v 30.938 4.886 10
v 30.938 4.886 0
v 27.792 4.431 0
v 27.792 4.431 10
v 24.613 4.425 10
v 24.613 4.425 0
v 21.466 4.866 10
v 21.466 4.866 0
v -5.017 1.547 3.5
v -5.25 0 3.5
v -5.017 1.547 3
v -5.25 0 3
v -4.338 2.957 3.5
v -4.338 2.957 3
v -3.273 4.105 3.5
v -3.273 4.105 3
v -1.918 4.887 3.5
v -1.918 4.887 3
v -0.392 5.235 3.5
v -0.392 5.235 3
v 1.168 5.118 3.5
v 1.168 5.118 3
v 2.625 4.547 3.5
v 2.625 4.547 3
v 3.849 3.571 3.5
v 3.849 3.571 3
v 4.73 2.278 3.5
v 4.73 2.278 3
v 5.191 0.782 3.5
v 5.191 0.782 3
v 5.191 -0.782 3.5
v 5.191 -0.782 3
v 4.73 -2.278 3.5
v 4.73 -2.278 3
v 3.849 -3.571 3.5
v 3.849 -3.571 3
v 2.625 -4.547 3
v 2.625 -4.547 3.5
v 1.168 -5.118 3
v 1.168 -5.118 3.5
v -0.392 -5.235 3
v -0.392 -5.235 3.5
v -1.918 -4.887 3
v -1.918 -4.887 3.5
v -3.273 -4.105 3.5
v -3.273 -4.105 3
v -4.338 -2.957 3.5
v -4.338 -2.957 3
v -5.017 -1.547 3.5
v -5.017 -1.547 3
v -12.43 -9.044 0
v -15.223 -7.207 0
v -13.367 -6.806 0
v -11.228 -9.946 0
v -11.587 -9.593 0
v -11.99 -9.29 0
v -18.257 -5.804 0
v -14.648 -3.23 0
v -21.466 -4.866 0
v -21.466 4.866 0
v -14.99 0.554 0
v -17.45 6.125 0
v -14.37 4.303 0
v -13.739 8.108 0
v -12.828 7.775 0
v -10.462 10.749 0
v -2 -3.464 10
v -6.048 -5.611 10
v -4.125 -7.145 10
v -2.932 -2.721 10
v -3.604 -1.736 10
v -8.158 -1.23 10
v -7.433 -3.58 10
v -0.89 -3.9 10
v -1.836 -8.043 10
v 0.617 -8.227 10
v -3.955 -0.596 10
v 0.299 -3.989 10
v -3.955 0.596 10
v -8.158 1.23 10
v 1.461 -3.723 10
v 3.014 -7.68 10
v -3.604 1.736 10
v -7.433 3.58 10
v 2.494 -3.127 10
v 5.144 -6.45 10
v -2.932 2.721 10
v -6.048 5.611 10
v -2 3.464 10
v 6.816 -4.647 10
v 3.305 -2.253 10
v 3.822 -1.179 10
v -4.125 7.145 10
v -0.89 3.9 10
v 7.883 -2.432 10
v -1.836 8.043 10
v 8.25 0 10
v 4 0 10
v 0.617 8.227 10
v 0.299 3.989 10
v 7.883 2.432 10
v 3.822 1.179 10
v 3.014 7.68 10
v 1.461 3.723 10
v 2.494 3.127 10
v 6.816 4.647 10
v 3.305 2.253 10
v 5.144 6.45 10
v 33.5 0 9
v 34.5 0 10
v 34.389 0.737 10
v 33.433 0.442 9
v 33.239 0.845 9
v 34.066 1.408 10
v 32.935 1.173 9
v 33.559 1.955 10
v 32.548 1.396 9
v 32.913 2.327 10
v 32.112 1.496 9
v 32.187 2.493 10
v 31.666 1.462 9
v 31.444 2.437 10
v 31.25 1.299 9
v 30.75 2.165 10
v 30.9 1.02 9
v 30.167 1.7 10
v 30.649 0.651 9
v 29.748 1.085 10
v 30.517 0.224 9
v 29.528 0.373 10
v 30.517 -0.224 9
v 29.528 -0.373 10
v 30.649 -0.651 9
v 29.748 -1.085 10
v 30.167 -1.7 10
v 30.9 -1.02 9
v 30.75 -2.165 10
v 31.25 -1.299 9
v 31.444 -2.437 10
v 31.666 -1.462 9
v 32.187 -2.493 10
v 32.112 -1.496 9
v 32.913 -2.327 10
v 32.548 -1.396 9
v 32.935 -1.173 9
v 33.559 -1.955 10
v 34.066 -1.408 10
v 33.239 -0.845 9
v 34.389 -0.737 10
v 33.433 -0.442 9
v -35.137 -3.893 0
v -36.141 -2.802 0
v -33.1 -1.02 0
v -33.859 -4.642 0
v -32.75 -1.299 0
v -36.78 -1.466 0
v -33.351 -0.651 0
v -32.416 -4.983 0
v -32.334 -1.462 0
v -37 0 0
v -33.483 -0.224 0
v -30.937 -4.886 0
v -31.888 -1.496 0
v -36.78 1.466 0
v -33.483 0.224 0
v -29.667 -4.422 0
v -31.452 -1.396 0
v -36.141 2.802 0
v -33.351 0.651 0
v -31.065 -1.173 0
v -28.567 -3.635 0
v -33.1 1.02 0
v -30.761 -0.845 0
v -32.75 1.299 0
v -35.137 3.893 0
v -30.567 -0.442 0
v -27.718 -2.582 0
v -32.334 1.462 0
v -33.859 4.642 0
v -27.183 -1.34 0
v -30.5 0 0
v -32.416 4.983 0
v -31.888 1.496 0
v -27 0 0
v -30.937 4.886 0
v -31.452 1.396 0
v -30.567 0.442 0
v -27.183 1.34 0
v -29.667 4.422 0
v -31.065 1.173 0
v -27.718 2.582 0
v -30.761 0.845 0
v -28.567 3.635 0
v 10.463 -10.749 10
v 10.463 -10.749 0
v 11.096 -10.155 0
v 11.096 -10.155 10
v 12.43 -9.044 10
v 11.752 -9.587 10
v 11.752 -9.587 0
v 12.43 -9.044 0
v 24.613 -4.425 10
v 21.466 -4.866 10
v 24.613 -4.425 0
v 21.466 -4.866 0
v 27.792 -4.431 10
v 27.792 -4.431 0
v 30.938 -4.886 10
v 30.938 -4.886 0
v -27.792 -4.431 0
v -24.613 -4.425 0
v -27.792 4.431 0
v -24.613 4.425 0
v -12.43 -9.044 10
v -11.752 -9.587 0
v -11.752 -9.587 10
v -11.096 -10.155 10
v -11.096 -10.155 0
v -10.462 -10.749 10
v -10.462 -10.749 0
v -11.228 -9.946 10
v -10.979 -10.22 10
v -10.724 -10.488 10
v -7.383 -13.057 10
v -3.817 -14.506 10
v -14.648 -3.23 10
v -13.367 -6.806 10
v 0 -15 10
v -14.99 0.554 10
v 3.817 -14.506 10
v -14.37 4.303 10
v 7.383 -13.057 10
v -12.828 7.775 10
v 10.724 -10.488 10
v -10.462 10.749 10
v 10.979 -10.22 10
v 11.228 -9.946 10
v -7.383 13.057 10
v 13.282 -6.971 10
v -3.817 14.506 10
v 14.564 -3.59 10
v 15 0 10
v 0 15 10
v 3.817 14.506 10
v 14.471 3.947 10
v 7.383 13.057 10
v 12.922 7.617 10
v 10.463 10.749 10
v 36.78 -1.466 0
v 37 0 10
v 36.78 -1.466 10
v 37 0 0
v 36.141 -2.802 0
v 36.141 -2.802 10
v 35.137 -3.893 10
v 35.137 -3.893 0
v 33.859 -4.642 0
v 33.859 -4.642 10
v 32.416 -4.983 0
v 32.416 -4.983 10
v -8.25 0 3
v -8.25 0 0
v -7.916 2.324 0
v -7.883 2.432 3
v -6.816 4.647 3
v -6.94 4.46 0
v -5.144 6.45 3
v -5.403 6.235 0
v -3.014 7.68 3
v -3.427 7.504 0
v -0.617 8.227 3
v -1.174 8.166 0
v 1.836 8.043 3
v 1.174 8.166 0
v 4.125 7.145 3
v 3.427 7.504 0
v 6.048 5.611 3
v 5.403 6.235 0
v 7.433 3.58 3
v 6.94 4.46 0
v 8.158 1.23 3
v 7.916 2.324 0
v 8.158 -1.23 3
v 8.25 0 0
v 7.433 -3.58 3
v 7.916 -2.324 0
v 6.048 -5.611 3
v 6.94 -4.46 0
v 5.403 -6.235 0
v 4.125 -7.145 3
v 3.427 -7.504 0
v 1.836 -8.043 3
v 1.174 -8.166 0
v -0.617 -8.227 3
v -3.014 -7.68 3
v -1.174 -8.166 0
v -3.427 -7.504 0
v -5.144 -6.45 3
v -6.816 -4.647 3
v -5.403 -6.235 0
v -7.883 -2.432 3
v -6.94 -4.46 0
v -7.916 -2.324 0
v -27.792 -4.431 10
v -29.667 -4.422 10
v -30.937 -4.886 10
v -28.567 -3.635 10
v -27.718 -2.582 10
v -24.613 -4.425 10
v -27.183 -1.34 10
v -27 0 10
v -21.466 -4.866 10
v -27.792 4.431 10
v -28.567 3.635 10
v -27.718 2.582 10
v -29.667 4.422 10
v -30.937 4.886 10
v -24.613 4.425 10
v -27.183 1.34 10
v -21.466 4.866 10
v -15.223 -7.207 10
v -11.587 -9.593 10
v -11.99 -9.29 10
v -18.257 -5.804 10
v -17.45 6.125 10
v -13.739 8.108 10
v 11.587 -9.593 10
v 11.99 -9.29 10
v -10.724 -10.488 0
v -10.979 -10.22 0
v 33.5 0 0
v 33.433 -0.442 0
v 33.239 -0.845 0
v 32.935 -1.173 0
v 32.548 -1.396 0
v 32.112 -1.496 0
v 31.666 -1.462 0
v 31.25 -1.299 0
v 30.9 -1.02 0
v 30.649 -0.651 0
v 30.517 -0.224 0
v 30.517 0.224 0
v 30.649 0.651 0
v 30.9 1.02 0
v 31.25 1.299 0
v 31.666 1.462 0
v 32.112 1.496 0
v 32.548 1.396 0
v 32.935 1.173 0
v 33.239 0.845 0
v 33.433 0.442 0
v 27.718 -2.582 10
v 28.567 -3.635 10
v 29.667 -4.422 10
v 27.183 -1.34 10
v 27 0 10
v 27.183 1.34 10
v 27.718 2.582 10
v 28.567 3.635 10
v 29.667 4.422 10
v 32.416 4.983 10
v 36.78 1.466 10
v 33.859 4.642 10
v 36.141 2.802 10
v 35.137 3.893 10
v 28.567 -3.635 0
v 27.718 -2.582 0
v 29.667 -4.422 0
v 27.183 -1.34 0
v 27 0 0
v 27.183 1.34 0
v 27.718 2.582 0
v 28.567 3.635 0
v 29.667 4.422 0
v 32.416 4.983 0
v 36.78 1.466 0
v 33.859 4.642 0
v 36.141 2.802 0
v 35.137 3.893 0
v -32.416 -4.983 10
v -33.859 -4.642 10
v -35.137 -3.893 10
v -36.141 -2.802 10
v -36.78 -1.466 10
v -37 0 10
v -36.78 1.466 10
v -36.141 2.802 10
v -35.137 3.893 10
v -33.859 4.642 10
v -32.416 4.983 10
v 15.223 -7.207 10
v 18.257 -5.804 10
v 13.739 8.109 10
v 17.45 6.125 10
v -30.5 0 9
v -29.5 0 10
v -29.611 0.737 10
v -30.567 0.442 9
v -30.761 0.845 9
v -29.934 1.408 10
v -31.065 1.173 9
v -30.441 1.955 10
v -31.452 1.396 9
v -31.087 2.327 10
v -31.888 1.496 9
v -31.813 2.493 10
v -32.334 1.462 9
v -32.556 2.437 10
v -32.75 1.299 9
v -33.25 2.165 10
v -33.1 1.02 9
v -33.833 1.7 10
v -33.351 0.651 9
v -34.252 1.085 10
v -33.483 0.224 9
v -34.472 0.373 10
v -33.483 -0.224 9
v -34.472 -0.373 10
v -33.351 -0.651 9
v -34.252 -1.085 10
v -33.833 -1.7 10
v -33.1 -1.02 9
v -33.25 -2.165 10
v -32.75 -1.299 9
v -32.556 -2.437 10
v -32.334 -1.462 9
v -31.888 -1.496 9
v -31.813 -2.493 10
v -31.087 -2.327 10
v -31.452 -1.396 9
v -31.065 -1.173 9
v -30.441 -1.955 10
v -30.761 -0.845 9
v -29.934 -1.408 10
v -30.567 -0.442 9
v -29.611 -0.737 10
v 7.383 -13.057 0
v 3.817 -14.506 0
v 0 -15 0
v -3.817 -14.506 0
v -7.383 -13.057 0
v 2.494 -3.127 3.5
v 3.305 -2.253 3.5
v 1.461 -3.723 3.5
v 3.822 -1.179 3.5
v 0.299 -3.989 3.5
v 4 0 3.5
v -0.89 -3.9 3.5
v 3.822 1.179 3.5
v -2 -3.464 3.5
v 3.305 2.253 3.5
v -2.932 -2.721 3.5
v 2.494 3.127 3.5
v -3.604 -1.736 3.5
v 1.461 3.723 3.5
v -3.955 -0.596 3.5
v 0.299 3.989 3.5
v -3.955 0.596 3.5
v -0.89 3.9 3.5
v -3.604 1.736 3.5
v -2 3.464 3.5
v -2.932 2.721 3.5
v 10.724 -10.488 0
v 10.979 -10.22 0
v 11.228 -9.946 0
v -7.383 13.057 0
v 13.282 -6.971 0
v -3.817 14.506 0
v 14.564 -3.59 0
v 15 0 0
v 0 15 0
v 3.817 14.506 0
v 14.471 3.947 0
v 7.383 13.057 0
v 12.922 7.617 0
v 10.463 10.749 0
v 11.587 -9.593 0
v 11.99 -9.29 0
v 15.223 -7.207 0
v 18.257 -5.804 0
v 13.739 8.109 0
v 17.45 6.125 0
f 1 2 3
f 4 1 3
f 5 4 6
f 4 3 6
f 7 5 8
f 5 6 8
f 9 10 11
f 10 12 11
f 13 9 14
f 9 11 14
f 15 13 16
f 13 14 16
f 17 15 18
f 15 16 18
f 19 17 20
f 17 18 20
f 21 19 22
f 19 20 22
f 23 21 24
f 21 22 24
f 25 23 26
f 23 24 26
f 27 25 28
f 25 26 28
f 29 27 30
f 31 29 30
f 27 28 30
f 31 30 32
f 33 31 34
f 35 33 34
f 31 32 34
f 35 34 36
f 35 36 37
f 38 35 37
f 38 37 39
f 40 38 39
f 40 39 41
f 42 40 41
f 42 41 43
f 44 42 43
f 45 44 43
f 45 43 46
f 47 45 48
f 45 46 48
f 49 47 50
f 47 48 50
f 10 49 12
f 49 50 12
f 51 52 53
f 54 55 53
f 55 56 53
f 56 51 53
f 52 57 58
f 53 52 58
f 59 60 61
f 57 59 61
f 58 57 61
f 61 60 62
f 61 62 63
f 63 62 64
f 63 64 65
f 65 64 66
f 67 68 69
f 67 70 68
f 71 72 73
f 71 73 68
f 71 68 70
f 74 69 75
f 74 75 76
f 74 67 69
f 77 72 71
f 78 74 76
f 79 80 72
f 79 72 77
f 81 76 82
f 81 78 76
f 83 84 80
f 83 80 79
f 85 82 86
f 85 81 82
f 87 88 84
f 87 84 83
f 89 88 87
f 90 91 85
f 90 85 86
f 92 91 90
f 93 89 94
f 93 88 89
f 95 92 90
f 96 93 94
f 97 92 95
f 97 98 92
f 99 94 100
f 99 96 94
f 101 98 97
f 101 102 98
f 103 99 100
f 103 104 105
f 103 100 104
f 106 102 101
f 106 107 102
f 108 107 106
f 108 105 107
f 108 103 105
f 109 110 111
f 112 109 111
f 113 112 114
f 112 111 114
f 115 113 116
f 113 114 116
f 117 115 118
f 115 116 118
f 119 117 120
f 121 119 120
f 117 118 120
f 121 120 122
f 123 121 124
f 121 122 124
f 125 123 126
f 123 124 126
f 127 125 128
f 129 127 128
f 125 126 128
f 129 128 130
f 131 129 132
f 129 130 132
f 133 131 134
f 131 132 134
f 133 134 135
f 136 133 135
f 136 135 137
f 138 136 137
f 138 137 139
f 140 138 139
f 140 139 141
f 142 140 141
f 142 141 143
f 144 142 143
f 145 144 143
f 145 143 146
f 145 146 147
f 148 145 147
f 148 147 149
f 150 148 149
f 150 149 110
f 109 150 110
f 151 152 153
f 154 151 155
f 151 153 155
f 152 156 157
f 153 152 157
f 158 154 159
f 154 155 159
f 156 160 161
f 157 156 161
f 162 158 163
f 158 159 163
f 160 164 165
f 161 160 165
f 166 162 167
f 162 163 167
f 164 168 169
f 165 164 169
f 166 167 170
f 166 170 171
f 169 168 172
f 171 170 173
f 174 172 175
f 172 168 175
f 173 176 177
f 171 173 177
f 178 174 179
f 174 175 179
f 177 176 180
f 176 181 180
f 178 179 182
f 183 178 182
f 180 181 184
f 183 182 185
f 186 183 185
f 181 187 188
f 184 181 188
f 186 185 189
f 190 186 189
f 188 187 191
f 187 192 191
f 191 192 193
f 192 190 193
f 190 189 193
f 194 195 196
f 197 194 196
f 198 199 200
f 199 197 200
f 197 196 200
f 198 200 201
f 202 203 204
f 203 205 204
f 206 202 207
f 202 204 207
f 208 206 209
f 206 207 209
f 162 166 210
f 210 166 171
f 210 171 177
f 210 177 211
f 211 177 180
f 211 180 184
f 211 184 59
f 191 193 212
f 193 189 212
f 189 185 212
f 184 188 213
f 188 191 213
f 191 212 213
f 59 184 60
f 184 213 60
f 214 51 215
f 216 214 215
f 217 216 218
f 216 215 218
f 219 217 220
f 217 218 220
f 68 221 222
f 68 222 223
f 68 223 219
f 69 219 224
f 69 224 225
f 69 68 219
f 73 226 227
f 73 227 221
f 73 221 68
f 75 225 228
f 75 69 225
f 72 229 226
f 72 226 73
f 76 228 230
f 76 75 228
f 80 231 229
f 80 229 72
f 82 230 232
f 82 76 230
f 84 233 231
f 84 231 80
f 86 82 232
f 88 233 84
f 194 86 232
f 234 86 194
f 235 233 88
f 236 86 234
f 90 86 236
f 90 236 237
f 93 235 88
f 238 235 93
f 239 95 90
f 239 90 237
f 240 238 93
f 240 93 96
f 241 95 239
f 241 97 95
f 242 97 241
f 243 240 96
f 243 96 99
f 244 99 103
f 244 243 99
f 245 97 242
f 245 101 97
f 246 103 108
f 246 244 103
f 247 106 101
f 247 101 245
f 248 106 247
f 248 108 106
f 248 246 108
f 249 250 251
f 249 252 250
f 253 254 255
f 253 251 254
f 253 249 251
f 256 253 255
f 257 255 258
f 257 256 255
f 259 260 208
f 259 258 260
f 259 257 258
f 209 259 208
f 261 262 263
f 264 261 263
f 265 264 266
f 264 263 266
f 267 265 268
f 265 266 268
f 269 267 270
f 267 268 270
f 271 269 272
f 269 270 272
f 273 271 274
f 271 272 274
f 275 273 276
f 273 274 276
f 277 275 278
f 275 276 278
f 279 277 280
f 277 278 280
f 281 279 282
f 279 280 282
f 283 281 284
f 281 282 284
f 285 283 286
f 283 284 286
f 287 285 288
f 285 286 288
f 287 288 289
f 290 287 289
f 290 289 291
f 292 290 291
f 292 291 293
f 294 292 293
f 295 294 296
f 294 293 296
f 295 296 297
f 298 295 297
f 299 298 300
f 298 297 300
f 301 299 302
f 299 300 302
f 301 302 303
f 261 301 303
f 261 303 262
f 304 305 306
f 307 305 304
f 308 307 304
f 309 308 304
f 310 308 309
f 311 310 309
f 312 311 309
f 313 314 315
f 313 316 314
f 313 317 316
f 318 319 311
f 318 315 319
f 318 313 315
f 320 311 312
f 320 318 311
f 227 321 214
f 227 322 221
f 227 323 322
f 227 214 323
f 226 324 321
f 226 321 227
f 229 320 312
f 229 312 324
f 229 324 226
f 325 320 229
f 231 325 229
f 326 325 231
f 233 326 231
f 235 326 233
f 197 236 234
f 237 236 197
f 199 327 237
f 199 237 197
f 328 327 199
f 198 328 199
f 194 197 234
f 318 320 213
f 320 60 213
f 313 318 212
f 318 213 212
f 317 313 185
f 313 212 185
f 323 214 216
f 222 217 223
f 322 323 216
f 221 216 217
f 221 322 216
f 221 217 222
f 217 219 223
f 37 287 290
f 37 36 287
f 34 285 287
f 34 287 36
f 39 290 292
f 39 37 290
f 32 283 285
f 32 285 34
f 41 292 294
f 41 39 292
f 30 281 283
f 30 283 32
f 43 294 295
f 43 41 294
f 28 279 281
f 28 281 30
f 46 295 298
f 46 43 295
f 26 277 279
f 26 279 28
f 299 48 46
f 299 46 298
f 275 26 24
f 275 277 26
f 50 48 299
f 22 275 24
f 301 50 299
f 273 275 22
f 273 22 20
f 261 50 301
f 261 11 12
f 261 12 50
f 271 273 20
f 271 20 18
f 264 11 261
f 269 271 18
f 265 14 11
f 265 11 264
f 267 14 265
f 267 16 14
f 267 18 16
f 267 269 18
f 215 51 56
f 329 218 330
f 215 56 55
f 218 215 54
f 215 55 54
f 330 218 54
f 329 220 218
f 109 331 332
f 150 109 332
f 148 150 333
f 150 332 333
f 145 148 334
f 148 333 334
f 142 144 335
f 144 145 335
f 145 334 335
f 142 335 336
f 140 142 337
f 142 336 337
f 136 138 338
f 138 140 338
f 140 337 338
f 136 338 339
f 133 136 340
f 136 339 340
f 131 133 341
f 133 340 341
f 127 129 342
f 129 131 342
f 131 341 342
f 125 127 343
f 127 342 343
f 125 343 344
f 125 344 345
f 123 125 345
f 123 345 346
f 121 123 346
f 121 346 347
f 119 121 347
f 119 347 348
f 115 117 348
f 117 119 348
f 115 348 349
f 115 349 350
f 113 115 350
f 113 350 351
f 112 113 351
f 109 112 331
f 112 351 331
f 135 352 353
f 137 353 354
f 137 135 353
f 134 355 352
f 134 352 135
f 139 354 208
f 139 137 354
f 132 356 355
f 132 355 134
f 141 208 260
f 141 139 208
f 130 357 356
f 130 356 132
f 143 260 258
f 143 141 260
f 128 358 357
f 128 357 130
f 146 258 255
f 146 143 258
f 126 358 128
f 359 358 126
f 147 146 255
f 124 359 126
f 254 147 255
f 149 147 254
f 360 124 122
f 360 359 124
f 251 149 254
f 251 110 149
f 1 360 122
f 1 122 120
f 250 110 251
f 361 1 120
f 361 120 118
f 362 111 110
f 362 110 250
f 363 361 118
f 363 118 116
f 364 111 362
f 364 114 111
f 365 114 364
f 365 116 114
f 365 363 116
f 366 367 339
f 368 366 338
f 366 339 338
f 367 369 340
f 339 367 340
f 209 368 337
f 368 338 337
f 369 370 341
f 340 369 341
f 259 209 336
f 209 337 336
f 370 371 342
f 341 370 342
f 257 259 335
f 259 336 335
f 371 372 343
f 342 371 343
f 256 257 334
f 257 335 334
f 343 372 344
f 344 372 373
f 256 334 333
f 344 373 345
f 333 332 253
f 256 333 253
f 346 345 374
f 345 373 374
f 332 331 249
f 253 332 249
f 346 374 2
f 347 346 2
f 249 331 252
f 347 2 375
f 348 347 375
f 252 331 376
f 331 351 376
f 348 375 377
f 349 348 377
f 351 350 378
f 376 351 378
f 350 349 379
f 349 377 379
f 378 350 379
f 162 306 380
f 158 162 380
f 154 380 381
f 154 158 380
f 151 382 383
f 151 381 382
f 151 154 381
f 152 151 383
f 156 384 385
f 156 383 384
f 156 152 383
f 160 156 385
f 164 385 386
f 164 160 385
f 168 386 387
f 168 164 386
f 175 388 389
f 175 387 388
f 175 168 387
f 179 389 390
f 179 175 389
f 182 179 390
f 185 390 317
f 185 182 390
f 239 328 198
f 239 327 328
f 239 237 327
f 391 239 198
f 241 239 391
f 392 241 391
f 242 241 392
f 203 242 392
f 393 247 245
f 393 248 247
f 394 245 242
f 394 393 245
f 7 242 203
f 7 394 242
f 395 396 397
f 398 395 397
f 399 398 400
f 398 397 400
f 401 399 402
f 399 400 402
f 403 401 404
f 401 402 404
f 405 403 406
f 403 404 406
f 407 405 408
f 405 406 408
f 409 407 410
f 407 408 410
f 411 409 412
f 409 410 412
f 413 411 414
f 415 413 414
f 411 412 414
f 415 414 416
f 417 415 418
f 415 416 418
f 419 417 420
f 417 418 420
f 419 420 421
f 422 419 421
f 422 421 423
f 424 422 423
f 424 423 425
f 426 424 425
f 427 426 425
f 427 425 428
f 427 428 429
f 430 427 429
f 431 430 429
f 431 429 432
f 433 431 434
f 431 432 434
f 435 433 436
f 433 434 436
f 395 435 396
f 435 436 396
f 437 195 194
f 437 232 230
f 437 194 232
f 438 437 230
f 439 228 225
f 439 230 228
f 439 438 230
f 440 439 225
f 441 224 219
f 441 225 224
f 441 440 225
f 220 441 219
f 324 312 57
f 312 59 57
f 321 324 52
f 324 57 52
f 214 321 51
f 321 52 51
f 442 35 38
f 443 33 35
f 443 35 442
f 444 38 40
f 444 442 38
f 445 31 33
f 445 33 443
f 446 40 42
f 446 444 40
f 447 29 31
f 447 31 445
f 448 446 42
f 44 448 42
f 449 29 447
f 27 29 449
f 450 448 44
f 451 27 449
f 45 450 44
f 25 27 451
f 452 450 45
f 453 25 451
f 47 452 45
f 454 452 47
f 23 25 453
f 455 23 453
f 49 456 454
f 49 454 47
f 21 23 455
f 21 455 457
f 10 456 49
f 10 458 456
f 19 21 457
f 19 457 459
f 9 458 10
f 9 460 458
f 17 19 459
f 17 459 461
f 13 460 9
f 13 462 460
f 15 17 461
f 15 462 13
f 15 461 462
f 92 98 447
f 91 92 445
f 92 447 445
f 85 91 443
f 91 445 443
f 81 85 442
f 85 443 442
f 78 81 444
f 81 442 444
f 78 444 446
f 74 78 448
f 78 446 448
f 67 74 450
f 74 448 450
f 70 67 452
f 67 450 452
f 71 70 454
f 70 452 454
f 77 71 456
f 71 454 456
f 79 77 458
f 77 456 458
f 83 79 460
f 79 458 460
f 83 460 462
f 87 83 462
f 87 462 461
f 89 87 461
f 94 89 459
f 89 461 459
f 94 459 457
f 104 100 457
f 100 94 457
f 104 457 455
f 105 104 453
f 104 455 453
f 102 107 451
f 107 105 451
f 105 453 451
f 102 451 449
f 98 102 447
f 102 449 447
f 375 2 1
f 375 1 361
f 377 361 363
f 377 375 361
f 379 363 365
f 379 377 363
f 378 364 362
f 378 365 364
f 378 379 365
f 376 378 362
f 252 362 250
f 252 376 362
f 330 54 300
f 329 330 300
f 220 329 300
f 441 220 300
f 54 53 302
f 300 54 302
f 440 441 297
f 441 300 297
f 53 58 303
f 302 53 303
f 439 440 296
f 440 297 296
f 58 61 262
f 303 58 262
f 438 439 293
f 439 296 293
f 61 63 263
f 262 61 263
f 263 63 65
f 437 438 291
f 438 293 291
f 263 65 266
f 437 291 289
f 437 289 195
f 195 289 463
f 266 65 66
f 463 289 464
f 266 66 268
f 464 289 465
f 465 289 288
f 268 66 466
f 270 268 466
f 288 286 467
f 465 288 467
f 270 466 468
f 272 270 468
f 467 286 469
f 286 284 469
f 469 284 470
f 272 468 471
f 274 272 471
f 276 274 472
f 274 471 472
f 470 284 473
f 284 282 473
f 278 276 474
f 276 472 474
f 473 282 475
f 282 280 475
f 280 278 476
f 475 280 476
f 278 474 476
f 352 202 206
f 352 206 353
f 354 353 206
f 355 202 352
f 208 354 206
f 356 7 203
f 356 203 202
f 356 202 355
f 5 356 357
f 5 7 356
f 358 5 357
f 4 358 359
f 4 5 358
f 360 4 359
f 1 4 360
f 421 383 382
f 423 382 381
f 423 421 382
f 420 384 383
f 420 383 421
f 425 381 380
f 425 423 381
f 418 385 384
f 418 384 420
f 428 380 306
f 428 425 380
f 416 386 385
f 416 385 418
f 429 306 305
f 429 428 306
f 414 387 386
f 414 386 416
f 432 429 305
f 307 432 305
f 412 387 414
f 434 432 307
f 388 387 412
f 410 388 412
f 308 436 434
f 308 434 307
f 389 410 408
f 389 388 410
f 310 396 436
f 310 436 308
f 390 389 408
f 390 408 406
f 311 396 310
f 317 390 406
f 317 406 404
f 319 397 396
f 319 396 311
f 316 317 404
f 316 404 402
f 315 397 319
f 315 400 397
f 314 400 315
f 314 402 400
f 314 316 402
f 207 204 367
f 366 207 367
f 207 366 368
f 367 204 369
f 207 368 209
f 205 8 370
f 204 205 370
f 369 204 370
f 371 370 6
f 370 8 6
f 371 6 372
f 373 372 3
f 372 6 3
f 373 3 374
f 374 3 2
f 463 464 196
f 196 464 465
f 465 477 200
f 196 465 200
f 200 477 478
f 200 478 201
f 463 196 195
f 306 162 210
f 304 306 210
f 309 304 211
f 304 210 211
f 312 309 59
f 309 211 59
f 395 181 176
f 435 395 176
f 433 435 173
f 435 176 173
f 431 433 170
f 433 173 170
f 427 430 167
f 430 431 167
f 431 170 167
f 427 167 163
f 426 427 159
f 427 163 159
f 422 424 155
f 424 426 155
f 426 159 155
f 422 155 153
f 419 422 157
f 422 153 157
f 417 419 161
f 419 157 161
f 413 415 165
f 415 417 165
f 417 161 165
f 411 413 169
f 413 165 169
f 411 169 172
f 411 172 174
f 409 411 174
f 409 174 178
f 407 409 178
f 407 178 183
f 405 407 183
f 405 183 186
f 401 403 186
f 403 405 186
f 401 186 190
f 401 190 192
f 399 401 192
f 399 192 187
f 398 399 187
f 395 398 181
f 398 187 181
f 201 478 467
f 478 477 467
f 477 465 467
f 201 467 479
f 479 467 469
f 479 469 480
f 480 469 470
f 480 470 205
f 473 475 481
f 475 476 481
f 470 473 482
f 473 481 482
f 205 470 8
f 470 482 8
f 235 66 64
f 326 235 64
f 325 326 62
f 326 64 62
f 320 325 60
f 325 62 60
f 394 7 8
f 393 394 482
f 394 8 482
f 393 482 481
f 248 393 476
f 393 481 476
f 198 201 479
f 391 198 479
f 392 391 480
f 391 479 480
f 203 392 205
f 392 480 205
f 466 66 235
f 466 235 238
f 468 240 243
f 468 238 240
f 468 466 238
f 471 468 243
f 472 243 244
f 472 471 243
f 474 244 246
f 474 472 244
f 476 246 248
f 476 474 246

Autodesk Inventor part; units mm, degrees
ref_plane "YZ Plane" through (0, 0, 0) normal (1, 0, 0) x (0, 1, 0)
ref_plane "XZ Plane" through (0, 0, 0) normal (0, 1, 0) x (-1, 0, 0)
ref_plane "XY Plane" through (0, 0, 0) normal (0, 0, 1) x (1, 0, 0)
sketch "Boceto1" plane through (0, 0, 0) normal (0, 0, 1) x (1, 0, 0)
  circle A0 centre (0, 0) radius 8.25 projected
  arc A1 (-36.7643, -25.9497) -> (36.7643, -25.9497) centre (0, 0) ccw projected
  arc A2 (-35.5756, -20.5396) -> (-36.7643, -25.9497) centre (-33.7006, -23.7872) ccw projected
  line L0 (-35.5756, -20.5396) -> (-15.9099, -9.1856) projected
  arc A3 (-11.2279, -9.9465) -> (-15.9099, -9.1856) centre (-14.0349, -12.4332) ccw projected
  arc A4 (-11.2279, -9.9465) -> (11.2279, -9.9465) centre (0, 0) ccw projected
  arc A5 (15.9099, -9.1856) -> (11.2279, -9.9465) centre (14.0349, -12.4332) ccw projected
  line L1 (15.9099, -9.1856) -> (35.5756, -20.5396) projected
  arc A6 (36.7643, -25.9497) -> (35.5756, -20.5396) centre (33.7006, -23.7872) ccw projected
  line L2 (98, -98) -> (98, 98) projected
  line L3 (98, 98) -> (-98, 98) projected
  line L4 (-98, 98) -> (-98, -98) projected
  line L5 (-98, -98) -> (98, -98) projected
  circle A7 centre (0, 0) radius 4 projected
  line L6 (21.4655, -12.3931) -> (15.9099, -9.1856) projected
  arc A8 (15.9099, -9.1856) -> (11.2279, -9.9465) centre (14.0349, -12.4332) ccw projected
  arc A9 (-11.2279, -9.9465) -> (11.2279, -9.9465) centre (0, 0) ccw projected
  arc A10 (-11.2279, -9.9465) -> (-15.9099, -9.1856) centre (-14.0349, -12.4332) ccw projected
  line L7 (-15.9099, -9.1856) -> (-21.4655, -12.3931) projected
  line L8 (0, 0) -> (-32, 0) construction
  line L9 (0, 0) -> (32, 0) construction
  circle A11 centre (-32, 0) radius 1.5
  circle A12 centre (0, 0) radius 4
  circle A13 centre (-32, 0) radius 5
  circle A14 centre (0, 0) radius 15
  circle A15 centre (26.1563, -26.8719) radius 22.5
  circle A16 centre (-26.1562, -26.8719) radius 22.5
  circle A17 centre (-26.1562, 26.8719) radius 22.5
  circle A18 centre (26.1563, 26.8719) radius 22.5
  line L10 (0, 0) -> (32, 0) construction
  circle A19 centre (32, 0) radius 5
  circle A20 centre (32, 0) radius 1.5
  line L11 (21.4655, -12.3931) -> (21.4655, 21.4655) projected
  line L12 (-21.4655, 21.4655) -> (-21.4655, -12.3931) projected
  line L13 (21.4655, 21.4655) -> (-21.4655, 21.4655) projected
  point P0 (0, 0)
  point P1 (21.8181, -12.5967)
  point P2 (-21.8181, -12.5967)
  point P3 (-11.6313, -9.4678)
  point P4 (-10.4625, 10.7488)
  point P5 (-30.9375, 4.8858)
  point P6 (-30.9375, -4.8858)
  point P7 (-12.4296, -9.0441)
  point P8 (12.4296, -9.0441)
  point P9 (10.4625, 10.7488)
  point P10 (-11.1152, -43.6056)
  point P11 (11.1152, -43.6056)
  point P12 (-10.4625, -10.7488)
  point P13 (10.4625, -10.7488)
  point P14 (11.2279, -9.9465)
  point P15 (11.2279, -9.9465)
  point P16 (30.9375, -4.8858)
  point P17 (30.9375, 4.8858)
  dimension "d3" = 180
  dimension "d4" = 3
  dimension "d16" = 10
  dimension "d18" = 32
  dimension "d19" = 30
  dimension "empalme" = 45
  dimension "d22" = 45
  dimension "d23" = 45
  dimension "d24" = 45
  dimension "d27" = 32
  dimension "d28" = 10
  dimension "d29" = 3
extrude "Extrusión1" add sketch "Boceto1" along normal blind 10 contours A0 | A13 | A13 A17 L12 A16 | A4 A14 | A4 A5 A15 | L12 A17 A14 A3 A16 | A16 A3 A4 | A14 A18 L11 A15 A5 | A15 L11 A18 A19 | A19
sketch "Boceto2" plane through (0, 0, 0) normal (0, 0, -1) x (-1, 0, 0)
  circle A0 centre (0, 0) radius 8.25 projected
  point P0 (0, 0)
extrude "Extrusión2" cut sketch "Boceto2" against normal blind 3
sketch "Boceto3" plane through (0, 0, 3) normal (0, 0, -1) x (-1, 0, 0)
  circle A0 centre (0, 0) radius 5.25 projected
  point P0 (0, 0)
extrude "Extrusión3" cut sketch "Boceto3" against normal blind 0.5
chamfer "Chaflán1" distance 1 angle 45 2 edges at (30.5, 0, 10) (-33.5, 0, 10) measured on face at (-11.2475, 0, 10)
equation "\"d22\" = empalme"
equation "\"d23\" = empalme"
equation "\"d24\" = empalme"
properties part number "Brida_Rodamiento"
